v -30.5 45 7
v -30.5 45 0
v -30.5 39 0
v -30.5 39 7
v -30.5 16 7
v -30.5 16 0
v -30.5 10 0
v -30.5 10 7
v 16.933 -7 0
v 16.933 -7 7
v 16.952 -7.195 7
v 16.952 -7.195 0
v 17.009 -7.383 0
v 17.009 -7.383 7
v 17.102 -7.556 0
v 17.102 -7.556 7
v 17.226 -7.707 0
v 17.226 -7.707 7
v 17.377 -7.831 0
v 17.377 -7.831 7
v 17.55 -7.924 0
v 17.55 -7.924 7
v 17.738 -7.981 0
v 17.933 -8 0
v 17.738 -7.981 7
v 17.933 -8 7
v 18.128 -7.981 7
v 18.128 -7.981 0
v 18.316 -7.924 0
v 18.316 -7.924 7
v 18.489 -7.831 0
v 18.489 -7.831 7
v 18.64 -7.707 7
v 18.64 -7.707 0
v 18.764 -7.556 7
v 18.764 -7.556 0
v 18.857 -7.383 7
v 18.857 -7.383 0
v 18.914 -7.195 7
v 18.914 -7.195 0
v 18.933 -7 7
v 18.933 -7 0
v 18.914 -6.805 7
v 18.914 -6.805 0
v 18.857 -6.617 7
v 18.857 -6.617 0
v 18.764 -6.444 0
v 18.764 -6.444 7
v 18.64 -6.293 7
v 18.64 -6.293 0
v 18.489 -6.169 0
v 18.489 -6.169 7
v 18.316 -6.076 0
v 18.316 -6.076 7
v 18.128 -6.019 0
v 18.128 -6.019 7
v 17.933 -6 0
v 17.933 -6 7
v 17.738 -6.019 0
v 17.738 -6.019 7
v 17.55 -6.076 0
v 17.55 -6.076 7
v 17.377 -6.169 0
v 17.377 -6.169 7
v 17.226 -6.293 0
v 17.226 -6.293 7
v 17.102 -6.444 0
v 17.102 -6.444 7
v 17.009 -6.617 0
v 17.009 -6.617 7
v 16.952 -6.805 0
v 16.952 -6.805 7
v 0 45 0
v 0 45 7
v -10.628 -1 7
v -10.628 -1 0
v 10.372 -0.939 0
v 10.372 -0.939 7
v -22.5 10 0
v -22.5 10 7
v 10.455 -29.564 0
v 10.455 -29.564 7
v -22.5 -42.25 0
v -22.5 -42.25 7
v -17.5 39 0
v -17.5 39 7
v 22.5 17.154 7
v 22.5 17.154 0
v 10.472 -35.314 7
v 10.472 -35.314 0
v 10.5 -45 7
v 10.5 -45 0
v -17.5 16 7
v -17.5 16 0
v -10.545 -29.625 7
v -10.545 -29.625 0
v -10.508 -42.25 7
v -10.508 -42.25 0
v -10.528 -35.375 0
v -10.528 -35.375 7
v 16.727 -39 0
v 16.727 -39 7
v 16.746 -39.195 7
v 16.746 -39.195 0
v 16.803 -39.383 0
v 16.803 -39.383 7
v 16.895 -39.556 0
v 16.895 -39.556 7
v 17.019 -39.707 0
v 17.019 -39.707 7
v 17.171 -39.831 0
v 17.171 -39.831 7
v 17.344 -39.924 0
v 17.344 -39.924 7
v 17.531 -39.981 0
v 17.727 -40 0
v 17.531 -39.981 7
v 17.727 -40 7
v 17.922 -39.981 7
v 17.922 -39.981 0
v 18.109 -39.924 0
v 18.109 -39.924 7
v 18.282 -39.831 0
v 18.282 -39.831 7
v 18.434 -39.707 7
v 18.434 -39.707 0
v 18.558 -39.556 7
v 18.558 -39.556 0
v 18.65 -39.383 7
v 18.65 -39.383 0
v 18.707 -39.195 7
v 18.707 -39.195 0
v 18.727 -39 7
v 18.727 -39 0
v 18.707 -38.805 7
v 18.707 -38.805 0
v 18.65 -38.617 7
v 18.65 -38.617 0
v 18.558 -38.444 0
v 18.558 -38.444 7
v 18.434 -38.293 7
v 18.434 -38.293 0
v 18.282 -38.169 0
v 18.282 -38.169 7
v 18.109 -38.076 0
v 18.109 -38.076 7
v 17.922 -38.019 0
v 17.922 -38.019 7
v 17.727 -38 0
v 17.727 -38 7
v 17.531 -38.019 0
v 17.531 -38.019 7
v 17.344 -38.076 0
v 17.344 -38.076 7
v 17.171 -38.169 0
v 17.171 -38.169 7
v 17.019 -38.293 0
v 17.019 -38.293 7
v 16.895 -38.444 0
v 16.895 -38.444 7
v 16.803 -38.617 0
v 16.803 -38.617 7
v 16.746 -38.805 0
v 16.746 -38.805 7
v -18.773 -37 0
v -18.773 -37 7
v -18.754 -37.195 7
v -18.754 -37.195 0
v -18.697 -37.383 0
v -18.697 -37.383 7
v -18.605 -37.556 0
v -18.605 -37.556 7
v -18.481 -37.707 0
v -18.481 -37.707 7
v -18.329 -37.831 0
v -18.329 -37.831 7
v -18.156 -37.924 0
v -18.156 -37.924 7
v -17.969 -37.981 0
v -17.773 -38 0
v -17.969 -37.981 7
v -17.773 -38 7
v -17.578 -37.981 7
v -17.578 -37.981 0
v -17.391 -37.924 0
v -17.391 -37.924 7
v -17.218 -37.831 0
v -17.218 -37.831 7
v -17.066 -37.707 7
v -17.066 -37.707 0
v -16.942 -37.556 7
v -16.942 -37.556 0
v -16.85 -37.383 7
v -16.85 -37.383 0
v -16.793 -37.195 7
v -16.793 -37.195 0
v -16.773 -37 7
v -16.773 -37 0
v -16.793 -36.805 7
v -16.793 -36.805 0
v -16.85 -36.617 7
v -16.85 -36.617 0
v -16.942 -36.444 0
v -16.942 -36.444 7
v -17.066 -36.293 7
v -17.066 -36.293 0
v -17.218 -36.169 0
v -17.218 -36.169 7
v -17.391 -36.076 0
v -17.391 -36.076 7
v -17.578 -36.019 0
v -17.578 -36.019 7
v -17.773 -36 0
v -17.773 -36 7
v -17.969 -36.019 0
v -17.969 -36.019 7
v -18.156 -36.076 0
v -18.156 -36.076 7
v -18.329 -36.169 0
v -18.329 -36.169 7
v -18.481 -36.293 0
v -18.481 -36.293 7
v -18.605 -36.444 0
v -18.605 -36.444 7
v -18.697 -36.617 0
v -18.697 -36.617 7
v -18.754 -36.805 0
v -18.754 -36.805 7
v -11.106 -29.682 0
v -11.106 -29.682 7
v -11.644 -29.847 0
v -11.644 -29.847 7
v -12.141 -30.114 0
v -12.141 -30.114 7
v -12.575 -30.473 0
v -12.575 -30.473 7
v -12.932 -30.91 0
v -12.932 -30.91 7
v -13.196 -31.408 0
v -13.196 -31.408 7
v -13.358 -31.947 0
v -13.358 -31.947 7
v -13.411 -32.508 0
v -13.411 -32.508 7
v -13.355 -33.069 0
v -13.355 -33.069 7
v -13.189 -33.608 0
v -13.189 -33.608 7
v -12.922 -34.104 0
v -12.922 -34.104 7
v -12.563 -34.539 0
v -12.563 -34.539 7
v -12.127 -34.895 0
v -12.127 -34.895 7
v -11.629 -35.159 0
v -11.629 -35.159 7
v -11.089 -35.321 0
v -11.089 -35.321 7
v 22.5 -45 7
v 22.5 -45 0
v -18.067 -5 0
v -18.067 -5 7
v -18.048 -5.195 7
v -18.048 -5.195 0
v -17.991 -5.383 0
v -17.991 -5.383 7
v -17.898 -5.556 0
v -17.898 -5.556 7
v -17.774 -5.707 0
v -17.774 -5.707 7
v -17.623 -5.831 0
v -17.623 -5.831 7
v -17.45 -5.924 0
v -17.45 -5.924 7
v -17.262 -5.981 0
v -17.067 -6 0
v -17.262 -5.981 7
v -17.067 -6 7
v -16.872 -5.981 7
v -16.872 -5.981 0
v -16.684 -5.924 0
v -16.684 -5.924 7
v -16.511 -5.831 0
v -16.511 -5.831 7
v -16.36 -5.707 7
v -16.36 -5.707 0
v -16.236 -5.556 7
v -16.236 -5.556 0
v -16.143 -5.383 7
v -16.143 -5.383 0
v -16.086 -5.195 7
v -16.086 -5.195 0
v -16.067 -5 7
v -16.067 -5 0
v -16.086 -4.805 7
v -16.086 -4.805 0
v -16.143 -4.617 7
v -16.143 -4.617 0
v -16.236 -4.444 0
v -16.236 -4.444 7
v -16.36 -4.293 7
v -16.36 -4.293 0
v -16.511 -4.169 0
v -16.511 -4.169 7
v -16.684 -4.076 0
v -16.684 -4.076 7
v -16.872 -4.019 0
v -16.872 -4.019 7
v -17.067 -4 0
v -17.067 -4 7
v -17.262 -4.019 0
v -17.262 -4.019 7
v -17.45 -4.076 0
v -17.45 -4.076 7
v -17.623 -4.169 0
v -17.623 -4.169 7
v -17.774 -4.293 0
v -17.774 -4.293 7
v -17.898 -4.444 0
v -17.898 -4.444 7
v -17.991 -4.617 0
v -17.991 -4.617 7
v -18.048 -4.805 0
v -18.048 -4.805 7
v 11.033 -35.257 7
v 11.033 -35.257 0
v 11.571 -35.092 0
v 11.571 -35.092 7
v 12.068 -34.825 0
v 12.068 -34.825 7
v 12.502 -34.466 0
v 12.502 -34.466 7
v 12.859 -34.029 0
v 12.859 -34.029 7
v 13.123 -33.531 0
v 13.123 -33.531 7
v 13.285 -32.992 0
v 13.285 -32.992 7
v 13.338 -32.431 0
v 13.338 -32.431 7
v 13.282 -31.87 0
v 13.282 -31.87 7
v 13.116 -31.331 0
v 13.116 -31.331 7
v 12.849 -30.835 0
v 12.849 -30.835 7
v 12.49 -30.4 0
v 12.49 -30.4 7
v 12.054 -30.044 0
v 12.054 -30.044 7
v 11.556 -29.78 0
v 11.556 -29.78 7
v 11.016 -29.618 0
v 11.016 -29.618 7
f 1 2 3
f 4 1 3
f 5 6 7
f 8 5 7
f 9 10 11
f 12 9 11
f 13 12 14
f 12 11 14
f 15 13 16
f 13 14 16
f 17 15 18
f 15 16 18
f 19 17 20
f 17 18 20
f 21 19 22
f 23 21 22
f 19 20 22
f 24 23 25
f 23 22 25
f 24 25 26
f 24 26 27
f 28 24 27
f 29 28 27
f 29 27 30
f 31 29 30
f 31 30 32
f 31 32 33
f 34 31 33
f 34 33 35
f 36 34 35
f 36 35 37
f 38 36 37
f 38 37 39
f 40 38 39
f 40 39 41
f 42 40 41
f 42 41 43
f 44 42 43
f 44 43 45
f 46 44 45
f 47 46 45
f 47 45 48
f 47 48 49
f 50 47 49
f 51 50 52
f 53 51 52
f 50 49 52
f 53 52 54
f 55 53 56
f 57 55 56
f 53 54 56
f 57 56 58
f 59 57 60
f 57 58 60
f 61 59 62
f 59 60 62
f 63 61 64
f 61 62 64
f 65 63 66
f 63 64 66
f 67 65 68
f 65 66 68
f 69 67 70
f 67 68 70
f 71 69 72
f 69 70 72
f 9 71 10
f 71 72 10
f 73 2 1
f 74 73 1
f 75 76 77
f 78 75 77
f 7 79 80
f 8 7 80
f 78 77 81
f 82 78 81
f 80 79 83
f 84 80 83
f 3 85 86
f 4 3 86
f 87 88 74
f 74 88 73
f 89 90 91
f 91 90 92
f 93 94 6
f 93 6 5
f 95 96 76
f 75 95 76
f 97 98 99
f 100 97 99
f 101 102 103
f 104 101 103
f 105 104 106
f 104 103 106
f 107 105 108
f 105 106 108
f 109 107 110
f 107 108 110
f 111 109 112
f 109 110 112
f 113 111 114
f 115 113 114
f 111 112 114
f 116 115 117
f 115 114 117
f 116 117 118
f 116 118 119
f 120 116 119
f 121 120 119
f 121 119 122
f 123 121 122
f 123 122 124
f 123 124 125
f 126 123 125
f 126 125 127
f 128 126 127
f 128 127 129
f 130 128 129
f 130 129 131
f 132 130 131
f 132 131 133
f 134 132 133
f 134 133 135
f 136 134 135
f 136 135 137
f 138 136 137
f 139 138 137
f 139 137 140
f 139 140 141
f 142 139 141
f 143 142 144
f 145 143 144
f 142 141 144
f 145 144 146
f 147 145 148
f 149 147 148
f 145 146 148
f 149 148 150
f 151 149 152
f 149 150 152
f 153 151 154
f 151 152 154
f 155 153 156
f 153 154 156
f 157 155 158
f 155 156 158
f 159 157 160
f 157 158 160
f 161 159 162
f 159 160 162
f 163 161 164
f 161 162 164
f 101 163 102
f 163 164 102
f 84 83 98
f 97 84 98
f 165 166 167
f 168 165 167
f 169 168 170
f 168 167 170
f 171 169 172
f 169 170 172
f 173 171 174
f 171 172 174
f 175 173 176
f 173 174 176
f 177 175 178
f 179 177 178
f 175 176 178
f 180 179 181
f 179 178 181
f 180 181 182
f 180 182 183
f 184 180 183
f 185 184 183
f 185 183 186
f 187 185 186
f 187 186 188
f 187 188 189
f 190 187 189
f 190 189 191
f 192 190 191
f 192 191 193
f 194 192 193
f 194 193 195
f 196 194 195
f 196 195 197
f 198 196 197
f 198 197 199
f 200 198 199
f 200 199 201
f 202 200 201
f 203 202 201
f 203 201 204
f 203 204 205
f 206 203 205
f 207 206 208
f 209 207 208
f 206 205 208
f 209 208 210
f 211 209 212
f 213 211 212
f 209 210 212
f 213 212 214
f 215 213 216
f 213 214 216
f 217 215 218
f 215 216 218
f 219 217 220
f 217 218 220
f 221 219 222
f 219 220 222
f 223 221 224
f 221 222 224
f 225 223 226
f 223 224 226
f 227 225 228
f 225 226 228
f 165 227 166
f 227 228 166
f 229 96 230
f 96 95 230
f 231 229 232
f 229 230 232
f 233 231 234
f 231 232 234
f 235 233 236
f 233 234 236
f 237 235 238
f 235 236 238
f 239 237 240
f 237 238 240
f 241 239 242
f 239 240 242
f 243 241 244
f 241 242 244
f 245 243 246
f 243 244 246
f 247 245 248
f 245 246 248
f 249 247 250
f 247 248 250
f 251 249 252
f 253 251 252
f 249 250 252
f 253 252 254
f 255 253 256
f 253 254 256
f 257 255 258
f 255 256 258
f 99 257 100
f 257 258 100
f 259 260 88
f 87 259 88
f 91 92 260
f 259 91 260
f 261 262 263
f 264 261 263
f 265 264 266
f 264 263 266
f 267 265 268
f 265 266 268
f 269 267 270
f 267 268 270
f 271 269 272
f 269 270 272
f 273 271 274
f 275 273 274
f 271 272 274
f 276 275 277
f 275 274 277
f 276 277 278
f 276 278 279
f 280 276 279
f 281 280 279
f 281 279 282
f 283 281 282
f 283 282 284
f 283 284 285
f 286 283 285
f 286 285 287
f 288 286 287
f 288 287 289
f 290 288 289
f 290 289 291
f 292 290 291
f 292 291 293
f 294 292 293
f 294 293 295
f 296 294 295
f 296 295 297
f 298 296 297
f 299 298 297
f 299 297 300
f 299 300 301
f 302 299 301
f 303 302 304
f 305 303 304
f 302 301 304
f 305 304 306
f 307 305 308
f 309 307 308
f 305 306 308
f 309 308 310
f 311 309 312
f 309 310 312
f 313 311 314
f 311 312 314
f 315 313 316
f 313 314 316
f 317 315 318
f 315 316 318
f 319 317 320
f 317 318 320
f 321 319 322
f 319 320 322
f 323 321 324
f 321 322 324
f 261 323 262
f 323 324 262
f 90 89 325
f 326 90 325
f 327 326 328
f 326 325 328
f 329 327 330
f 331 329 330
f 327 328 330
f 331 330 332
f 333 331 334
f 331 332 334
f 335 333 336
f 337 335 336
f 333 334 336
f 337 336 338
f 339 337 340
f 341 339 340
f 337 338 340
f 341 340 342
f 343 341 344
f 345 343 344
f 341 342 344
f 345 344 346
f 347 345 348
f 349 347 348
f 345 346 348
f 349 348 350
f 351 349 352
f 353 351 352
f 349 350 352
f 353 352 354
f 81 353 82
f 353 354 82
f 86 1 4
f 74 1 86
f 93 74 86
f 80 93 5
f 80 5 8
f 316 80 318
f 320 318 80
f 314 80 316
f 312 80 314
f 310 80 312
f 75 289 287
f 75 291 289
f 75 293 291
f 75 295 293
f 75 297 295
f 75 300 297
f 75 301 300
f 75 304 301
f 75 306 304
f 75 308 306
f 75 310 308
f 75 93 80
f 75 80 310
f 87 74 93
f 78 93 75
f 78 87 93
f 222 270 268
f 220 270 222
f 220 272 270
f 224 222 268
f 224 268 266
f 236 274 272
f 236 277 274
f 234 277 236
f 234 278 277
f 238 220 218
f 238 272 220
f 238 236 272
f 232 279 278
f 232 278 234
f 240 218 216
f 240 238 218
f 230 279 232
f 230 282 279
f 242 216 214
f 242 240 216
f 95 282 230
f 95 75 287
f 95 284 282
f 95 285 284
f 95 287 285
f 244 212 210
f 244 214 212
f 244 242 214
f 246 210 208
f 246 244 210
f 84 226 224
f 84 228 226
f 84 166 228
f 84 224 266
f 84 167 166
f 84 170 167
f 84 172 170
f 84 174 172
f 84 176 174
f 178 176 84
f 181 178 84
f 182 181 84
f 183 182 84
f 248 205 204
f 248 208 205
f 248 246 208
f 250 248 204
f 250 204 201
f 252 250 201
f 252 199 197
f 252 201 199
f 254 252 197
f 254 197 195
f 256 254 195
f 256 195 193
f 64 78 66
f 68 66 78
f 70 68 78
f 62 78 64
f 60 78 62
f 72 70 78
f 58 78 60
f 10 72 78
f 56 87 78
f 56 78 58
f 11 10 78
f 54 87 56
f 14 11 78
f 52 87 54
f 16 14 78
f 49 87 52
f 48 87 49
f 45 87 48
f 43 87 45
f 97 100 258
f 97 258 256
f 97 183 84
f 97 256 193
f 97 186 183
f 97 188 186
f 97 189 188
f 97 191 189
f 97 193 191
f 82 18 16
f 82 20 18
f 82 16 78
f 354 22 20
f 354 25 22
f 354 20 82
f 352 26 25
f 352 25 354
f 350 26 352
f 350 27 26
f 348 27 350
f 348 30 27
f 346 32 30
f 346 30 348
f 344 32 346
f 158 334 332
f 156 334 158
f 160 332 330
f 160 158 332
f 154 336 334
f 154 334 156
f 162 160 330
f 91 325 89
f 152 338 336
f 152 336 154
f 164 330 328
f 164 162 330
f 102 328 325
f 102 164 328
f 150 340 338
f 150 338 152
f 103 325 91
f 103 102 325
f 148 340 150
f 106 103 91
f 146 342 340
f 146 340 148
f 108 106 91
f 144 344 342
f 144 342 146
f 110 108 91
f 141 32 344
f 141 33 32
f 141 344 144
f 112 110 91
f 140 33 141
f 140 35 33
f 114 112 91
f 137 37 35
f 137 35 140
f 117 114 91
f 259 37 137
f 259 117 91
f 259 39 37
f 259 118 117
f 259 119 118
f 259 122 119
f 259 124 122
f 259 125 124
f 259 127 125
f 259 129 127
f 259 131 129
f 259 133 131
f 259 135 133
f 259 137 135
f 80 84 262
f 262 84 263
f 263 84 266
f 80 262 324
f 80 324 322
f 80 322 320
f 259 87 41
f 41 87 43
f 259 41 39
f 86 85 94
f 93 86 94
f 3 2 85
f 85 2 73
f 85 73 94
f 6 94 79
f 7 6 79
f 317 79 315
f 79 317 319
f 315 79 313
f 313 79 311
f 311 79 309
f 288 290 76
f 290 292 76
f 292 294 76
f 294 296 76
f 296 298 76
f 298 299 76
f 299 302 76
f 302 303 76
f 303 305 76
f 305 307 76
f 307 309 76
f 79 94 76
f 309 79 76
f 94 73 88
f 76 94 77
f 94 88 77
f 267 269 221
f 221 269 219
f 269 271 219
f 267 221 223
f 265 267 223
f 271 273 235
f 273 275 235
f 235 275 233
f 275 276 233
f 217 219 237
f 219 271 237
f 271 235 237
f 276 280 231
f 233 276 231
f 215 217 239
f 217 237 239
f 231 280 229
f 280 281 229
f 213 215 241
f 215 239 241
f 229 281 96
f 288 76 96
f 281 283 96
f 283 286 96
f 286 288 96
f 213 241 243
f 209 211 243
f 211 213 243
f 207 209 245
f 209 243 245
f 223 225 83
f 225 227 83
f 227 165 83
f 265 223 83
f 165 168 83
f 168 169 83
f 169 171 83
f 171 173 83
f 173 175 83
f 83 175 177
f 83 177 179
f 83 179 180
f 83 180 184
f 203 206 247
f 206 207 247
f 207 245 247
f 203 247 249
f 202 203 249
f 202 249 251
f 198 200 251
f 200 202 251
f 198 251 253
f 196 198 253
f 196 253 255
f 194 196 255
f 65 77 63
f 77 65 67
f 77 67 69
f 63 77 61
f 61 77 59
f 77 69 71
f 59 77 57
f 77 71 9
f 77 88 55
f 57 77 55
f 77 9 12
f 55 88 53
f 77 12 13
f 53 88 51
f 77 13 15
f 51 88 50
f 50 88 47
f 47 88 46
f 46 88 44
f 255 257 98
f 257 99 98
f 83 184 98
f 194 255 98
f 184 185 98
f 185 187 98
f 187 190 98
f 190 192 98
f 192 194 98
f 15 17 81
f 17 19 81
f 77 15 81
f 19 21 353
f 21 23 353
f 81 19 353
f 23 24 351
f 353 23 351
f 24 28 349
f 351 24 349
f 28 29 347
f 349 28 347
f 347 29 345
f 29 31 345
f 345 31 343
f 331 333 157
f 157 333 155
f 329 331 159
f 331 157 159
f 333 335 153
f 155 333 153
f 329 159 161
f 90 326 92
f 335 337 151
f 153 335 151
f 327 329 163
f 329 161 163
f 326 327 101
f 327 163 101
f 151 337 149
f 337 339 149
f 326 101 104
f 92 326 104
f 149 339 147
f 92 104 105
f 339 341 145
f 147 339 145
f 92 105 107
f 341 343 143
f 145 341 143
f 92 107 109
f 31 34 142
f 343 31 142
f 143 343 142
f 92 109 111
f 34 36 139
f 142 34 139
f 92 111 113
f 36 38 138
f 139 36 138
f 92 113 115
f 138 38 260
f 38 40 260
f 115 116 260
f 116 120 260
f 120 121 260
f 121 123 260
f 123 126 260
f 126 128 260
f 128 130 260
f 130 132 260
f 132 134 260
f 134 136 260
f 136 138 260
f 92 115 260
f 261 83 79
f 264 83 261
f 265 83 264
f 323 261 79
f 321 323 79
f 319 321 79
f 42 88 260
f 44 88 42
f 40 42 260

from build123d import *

# Parameters (mm, degrees)
F1_DEPTH = 7
F2_D     = 2
F3_D     = 5.75
F4_DEPTH = 16
F5_DEPTH = 5


with BuildPart() as f1:
    # F0 (on Top) → F1 (new body)
    with BuildSketch(Plane.XY):
        Polygon((10.5, -45), (22.5, -45), (22.5, 17.153987661), (0, 45), (-14.5, 45), (-14.5, 39), (-22.5, 39), (-22.5, 16), (-14.5, 16), (-14.5, 10), (-22.5, 10), (-22.5, -42.25), (-10.5080957781, -42.25), (-10.6281967604, -1.0001864958), (10.3717142302, -0.9390441602), align=None)
    extrude(amount=F1_DEPTH)

    # F2 (through all)
    with Locations(Plane(origin=(0, 0, 0), x_dir=(1, 0, 0), z_dir=(0, 0, -1))):
        with Locations((-17.0669870824, 5), (-17.7734121563, 37), (17.7265878437, 39), (17.9330129176, 7)):
            Hole(F2_D / 2)

    # F3 (through all)
    with Locations(Plane(origin=(0, 0, 0), x_dir=(1, 0, 0), z_dir=(0, 0, -1))):
        with Locations((-10.5364832571, 32.5000529818), (10.4634277335, 32.4389106462)):
            Hole(F3_D / 2)

    # F4 (add): faces of the model
    f4_faces = [f1.faces().sort_by_distance(p)[0] for p in [
        (-14.5, 42, 3.5),
        (-14.5, 13, 3.5),
    ]]
    extrude(f4_faces, amount=F4_DEPTH)

    # F5 (cut): a face of the model
    f5_faces = [f1.faces().sort_by_distance(p)[0] for p in [
        (-22.5, 27.5, 3.5),
    ]]
    extrude(f5_faces, amount=-F5_DEPTH, mode=Mode.SUBTRACT)


solid = f1.part
